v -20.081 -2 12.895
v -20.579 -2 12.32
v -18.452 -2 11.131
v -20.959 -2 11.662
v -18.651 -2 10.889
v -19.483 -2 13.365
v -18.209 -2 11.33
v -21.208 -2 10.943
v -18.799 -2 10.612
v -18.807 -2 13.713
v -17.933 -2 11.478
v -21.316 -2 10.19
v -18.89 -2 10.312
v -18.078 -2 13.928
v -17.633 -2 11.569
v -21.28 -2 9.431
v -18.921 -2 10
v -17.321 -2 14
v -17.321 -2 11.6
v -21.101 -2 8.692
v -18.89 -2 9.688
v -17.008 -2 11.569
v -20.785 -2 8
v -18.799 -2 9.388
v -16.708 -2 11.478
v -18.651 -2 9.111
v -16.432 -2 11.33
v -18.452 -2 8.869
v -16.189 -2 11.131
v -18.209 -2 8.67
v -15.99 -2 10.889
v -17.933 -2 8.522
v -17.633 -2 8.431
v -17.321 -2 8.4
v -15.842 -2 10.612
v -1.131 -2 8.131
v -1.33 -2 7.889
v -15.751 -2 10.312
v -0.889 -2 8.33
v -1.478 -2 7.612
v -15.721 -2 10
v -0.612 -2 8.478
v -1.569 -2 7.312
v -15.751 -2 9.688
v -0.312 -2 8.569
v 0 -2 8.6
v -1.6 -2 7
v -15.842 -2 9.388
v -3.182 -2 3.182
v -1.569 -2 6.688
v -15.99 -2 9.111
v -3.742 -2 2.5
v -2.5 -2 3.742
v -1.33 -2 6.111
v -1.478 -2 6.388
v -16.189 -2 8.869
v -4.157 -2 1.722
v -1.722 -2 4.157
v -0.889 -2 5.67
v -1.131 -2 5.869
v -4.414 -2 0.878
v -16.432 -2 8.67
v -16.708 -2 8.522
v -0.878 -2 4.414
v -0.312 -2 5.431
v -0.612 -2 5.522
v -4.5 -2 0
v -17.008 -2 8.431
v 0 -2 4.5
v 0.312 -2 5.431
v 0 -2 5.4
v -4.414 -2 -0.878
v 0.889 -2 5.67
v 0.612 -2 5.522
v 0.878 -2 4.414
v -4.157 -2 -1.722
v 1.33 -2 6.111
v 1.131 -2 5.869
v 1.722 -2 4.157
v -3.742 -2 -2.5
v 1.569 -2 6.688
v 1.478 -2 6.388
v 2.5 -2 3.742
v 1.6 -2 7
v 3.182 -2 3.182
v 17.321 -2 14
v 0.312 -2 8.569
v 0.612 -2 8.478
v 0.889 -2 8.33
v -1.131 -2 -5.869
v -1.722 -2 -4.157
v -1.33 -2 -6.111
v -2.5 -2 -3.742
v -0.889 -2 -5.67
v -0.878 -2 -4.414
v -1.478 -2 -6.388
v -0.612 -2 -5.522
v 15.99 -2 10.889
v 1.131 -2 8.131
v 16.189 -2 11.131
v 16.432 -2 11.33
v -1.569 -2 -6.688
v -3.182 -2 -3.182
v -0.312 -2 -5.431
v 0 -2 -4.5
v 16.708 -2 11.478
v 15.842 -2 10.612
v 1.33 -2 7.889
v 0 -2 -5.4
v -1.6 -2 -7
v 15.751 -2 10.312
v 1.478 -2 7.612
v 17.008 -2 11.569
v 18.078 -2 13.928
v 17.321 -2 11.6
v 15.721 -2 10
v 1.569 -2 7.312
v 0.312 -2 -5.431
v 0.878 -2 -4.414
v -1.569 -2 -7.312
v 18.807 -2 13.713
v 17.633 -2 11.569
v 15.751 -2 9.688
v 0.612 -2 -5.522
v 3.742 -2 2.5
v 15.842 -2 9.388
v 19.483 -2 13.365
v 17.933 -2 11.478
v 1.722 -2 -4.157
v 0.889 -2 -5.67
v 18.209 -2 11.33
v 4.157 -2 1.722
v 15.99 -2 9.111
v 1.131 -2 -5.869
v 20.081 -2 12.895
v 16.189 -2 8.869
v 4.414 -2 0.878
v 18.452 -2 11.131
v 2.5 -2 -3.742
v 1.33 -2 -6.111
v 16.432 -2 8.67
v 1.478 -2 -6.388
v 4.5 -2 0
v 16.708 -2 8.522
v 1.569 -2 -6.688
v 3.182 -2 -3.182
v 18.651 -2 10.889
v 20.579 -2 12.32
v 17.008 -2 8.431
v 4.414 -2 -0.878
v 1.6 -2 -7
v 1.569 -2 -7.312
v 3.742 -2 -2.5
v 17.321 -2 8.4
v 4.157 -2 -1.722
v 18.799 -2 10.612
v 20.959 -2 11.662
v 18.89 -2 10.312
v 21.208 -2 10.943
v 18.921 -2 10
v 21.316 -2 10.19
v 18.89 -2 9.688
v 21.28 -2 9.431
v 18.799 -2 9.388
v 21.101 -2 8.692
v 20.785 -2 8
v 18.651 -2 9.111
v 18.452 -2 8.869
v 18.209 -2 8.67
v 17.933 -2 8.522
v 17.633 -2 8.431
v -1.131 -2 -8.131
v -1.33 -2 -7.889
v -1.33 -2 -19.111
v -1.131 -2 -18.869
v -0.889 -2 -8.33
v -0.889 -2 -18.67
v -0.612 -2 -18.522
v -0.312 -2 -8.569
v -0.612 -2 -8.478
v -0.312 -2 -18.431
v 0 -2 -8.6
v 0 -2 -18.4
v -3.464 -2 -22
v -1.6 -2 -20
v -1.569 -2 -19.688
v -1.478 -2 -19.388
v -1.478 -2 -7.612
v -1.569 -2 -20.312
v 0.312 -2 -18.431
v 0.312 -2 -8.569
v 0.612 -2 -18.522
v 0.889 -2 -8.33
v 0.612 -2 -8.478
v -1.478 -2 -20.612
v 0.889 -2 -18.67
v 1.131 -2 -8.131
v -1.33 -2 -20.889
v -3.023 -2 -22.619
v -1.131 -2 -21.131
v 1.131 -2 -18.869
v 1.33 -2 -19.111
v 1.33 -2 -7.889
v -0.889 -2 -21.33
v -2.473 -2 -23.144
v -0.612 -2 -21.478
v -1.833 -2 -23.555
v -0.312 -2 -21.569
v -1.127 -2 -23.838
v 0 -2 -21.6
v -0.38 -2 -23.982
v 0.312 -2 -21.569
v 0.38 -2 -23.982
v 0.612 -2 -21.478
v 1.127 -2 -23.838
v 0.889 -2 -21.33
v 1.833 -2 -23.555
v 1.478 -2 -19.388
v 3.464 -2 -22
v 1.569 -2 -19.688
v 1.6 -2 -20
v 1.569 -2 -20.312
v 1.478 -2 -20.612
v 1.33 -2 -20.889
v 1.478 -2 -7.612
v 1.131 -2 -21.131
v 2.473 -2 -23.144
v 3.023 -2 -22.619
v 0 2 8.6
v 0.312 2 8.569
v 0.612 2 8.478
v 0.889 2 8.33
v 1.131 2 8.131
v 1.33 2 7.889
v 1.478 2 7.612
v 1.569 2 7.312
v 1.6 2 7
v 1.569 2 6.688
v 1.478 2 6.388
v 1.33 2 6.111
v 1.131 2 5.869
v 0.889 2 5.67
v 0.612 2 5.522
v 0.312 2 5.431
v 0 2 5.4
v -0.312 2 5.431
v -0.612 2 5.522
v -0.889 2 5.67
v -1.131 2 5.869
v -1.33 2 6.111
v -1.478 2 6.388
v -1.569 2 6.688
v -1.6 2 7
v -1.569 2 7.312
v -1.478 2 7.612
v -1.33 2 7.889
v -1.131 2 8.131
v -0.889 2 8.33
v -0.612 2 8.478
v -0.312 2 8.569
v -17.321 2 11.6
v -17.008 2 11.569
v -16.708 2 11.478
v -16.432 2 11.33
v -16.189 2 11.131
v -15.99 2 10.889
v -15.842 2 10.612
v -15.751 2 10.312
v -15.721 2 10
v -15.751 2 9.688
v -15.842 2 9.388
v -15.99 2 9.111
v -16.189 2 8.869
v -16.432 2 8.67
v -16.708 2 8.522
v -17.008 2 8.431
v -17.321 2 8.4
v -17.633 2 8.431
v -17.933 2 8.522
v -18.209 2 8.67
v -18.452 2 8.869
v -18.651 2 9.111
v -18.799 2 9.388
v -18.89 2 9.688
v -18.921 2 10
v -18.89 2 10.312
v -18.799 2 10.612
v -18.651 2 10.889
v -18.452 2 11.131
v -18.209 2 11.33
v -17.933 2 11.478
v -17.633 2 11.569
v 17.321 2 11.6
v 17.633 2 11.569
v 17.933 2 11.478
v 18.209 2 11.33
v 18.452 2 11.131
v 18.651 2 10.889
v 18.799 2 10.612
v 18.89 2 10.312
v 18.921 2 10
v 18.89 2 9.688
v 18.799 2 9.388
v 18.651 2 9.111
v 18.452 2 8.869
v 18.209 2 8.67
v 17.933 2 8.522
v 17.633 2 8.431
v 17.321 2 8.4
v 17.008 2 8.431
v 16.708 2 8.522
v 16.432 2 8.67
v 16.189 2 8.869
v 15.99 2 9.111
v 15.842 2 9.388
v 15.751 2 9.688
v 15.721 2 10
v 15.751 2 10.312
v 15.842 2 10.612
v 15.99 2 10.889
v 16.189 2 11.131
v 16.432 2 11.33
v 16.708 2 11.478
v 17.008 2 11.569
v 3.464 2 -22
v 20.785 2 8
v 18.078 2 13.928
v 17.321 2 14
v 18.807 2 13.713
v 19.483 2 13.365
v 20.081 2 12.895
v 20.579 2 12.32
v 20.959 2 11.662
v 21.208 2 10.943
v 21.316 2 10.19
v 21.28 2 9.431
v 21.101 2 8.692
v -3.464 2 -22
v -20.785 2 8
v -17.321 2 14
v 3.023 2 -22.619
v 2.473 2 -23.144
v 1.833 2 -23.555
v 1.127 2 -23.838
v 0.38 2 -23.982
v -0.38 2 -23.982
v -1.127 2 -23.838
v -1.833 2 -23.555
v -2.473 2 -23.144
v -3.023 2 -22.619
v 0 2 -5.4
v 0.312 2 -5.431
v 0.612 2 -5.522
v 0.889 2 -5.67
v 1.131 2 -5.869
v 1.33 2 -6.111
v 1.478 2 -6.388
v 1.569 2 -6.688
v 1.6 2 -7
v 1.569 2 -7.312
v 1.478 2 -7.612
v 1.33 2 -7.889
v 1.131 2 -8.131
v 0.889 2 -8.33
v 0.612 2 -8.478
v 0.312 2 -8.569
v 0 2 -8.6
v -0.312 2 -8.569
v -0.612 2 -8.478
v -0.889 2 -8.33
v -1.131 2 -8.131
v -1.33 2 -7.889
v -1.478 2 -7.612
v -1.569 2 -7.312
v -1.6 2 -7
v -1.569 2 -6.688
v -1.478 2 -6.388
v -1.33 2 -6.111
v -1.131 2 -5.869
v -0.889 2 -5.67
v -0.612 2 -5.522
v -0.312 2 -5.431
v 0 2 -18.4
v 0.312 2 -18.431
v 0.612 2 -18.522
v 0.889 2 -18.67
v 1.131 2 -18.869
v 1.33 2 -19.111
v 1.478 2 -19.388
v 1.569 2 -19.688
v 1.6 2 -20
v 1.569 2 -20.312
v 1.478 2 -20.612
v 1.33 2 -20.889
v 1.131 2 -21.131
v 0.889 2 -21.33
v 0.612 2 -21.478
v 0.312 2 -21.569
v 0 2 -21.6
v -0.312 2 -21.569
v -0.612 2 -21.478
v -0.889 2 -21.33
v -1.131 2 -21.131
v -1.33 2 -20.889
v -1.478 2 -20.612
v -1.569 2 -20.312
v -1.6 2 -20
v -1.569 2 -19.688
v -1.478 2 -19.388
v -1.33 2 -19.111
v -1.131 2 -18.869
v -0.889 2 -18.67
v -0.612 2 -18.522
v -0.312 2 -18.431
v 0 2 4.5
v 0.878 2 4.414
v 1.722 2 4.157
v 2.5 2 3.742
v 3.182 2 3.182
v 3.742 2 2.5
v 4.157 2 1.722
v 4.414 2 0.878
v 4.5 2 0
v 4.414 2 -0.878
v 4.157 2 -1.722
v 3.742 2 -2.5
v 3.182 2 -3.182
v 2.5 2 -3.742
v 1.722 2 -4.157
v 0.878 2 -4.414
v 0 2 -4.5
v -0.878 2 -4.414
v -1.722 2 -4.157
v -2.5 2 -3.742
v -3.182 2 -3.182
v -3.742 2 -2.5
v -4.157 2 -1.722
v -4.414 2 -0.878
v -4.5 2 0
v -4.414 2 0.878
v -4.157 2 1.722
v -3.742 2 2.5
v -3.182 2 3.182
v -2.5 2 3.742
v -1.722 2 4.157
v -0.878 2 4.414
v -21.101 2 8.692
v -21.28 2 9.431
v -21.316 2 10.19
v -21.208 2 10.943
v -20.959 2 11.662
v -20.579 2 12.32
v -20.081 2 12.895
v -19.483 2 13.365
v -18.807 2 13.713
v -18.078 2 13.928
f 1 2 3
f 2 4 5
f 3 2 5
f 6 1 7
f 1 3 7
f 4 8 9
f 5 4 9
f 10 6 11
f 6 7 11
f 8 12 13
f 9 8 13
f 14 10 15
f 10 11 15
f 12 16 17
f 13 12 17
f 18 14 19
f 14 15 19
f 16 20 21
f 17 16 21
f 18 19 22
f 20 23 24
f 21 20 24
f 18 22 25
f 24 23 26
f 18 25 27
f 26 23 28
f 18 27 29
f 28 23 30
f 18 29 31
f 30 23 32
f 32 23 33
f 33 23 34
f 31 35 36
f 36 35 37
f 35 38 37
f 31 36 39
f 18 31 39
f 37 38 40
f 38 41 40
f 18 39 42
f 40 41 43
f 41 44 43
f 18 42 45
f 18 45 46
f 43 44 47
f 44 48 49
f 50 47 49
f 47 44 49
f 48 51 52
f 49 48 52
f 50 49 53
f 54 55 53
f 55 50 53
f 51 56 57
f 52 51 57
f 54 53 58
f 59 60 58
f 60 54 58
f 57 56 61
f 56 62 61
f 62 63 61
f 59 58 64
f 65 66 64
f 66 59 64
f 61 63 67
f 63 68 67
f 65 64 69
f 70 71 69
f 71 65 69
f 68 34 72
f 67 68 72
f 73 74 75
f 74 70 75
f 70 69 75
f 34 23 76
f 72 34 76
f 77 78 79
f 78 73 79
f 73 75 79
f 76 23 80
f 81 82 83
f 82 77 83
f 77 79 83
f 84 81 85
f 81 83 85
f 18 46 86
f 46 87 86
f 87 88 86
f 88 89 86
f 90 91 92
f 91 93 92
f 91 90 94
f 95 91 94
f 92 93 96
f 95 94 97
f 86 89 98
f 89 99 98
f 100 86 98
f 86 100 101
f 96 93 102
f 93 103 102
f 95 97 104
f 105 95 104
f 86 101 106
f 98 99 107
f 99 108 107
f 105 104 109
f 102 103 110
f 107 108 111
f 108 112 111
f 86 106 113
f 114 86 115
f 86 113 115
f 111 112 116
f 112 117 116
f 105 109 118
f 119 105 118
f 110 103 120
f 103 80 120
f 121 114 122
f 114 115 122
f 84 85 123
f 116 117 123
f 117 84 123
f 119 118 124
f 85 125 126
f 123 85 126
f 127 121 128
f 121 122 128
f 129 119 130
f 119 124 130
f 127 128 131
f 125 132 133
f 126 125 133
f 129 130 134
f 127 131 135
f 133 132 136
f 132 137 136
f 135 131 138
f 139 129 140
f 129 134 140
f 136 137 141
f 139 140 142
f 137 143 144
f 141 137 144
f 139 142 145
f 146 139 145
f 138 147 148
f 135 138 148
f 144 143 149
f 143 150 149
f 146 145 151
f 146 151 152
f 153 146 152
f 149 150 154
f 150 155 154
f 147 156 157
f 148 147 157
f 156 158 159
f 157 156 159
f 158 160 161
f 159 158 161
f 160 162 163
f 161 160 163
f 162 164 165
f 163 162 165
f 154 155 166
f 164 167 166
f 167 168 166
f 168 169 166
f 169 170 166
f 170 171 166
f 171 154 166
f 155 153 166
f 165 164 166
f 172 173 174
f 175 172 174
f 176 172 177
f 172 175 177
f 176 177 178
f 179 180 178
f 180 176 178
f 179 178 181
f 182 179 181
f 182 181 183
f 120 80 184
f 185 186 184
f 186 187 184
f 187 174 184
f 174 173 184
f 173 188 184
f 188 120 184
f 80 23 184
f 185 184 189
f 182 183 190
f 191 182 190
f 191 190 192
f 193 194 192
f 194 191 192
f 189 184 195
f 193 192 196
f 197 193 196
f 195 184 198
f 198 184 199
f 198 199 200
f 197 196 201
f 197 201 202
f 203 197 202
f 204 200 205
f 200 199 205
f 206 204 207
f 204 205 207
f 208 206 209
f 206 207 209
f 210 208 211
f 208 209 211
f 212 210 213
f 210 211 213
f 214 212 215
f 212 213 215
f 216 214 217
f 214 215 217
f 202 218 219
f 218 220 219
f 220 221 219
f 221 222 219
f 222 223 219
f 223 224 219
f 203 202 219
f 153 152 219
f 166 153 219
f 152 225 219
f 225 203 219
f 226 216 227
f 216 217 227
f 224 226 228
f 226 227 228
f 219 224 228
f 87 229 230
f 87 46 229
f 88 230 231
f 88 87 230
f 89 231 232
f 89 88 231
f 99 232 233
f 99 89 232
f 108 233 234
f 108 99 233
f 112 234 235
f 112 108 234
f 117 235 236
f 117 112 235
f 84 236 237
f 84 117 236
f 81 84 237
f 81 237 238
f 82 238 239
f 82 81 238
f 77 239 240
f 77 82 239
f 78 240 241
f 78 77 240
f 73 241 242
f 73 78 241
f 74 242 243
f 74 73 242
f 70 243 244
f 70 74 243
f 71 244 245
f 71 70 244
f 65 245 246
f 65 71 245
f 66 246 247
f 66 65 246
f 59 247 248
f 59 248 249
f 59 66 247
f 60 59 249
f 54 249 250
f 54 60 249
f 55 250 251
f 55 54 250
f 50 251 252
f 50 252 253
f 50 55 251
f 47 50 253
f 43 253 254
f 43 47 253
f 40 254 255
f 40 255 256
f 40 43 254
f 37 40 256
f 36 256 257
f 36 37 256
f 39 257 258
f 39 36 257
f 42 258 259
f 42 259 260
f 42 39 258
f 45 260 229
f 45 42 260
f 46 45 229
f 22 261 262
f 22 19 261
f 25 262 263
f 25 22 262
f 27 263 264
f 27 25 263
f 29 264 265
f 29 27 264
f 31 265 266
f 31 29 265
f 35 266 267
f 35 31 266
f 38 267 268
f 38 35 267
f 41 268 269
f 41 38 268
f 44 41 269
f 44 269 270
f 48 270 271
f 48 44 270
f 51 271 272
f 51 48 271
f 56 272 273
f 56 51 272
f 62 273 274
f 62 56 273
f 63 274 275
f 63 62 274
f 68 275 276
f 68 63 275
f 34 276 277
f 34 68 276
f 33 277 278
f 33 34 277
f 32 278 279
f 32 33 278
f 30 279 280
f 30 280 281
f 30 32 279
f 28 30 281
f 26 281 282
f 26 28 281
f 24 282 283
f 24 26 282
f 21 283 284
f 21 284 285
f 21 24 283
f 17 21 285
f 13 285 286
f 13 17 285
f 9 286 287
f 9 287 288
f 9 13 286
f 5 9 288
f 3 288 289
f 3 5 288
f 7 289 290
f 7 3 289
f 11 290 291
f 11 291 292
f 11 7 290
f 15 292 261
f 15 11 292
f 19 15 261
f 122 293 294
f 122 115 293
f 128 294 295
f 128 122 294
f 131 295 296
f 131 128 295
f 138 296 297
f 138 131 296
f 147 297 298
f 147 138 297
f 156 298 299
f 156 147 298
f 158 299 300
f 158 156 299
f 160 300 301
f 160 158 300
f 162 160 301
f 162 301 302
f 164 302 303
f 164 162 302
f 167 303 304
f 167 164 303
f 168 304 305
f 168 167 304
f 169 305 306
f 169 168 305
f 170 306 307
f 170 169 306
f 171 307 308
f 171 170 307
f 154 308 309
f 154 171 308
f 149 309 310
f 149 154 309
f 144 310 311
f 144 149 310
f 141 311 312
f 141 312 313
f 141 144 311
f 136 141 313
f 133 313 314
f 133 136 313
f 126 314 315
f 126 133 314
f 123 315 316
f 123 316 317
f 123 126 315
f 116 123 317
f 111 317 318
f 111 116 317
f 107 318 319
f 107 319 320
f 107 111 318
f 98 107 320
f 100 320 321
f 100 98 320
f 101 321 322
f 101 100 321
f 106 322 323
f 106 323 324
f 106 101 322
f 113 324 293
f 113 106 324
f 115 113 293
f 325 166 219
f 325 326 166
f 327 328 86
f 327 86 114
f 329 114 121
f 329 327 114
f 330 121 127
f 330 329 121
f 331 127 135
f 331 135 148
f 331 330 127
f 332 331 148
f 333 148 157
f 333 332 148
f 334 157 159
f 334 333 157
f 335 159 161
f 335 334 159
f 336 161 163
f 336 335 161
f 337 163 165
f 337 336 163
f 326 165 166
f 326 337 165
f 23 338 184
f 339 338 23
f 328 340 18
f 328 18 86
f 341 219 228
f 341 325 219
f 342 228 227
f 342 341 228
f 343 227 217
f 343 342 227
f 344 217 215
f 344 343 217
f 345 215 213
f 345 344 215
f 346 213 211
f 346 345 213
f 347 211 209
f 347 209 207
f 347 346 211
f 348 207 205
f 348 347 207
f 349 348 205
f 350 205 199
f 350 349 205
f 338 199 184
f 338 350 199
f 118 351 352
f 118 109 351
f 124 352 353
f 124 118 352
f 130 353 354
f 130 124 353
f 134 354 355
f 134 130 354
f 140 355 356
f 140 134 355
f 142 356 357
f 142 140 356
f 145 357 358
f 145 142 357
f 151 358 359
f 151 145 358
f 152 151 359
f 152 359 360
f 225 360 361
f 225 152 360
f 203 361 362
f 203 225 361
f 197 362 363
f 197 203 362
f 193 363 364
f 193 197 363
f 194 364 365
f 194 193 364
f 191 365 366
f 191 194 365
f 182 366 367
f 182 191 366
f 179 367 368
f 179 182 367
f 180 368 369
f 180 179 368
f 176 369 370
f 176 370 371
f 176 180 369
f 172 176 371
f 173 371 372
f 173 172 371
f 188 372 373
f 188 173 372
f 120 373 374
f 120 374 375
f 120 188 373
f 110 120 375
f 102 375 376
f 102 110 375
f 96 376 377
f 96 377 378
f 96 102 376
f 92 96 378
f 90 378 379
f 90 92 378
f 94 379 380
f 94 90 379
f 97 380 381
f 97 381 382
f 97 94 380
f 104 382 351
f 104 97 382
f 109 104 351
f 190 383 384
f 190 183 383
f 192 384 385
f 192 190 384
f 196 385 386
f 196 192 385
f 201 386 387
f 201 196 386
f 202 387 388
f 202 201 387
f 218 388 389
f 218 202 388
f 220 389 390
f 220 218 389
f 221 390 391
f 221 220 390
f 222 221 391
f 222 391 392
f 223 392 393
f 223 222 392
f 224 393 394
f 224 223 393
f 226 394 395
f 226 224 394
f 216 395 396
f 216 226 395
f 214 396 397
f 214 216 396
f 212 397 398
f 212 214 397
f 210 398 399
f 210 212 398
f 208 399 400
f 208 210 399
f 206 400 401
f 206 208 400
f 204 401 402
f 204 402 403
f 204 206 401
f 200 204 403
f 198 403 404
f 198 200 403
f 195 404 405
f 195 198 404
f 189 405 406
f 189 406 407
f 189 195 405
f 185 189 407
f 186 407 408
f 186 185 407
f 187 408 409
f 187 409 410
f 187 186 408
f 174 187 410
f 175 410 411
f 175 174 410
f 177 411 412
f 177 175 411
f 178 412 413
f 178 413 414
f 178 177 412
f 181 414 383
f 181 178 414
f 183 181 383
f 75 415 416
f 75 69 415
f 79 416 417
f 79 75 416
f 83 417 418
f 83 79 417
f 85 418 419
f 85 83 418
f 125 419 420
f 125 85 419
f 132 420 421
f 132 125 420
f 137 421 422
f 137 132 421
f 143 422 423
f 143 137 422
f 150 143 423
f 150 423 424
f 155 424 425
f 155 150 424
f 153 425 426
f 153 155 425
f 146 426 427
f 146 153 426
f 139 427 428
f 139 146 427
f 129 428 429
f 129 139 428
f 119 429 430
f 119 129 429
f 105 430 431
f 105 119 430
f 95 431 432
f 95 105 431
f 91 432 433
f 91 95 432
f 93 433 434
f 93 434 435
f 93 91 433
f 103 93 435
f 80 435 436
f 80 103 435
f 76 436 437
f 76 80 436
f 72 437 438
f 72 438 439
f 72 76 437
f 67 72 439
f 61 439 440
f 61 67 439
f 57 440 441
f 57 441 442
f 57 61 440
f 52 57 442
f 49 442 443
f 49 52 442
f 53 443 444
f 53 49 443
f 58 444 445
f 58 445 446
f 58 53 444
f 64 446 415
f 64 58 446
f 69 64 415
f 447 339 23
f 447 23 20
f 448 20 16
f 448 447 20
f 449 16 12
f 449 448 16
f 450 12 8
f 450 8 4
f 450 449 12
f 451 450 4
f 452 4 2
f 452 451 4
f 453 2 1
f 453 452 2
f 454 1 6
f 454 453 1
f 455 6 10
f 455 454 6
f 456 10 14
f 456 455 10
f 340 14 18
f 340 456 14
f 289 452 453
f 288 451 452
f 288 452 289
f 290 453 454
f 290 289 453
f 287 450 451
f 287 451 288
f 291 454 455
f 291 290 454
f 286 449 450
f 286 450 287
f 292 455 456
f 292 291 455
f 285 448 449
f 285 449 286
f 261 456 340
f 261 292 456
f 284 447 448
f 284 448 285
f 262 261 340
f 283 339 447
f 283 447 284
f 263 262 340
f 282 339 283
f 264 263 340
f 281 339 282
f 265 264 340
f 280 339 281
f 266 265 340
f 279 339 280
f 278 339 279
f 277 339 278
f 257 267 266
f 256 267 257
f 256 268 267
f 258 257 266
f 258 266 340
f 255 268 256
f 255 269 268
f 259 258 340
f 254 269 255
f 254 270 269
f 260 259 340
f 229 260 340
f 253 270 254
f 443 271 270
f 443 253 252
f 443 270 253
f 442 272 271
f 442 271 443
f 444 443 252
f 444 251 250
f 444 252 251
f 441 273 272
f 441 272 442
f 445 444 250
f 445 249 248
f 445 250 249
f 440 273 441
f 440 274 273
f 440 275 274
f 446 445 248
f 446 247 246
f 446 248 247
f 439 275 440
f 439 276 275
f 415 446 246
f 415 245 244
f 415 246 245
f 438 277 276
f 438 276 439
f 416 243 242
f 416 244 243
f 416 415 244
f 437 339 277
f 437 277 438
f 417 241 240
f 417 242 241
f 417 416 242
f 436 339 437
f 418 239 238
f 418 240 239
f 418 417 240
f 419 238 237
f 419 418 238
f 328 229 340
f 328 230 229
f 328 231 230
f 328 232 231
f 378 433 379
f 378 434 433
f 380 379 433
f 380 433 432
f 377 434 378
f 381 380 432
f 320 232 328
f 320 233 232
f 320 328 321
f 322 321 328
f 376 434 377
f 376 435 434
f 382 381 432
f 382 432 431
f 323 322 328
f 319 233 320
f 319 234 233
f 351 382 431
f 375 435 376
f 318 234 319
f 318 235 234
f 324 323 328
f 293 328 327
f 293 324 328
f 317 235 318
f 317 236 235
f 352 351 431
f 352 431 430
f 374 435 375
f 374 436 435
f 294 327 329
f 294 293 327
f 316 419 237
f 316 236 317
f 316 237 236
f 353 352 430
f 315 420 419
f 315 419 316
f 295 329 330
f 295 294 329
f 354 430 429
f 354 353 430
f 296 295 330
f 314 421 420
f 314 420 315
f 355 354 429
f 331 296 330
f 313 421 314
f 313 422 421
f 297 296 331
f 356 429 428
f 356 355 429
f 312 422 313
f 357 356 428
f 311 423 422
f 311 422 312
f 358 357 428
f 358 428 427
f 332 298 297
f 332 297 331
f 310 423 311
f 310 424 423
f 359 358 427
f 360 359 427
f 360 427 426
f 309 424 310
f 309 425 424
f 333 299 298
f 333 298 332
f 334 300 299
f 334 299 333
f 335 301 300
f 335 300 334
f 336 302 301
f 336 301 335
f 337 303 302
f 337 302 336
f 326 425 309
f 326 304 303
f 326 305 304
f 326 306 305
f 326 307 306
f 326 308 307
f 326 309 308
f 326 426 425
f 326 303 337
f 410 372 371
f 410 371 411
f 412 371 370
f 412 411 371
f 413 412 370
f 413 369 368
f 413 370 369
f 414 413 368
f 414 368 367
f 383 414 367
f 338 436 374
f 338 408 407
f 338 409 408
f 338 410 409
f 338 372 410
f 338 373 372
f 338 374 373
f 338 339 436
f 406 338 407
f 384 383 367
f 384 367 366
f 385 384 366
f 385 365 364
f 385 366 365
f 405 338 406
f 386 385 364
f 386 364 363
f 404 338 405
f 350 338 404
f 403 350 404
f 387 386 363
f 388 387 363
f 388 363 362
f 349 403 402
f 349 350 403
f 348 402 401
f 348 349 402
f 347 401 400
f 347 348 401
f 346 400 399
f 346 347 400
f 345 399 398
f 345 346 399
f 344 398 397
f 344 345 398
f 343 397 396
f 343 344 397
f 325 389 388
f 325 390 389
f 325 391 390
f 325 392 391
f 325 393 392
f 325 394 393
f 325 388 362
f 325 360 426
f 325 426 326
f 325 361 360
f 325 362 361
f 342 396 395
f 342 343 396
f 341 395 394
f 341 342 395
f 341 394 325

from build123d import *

# Parameters (mm, degrees)
SKETCH_2_R      = 1.6
SKETCH_2_R_2    = 4.5
EXTRUDE_1_DEPTH = 2


with BuildPart() as part:
    # 草图2 → 凸台-拉伸1 (new, symmetric)
    with BuildSketch(Plane(origin=(0, 0, 0), x_dir=(1, 0, 0), z_dir=(0, 1, 0))):
        with BuildLine():
            Line((-3.464101615, 22), (-20.784609691, -8))
            ThreePointArc((-20.784609691, -8), (-20.784609691, -12), (-17.320508076, -14))
            Line((-17.320508076, -14), (17.320508076, -14))
            ThreePointArc((17.320508076, -14), (20.784609691, -12), (20.784609691, -8))
            Line((20.784609691, -8), (3.464101615, 22))
            ThreePointArc((3.464101615, 22), (0, 24), (-3.464101615, 22))
        make_face()
        with Locations(Location((0, 7, 0), (0, 0, 270))):
            Circle(SKETCH_2_R, mode=Mode.SUBTRACT)
        with Locations(Location((0, -7, 0), (0, 0, 270))):
            Circle(SKETCH_2_R, mode=Mode.SUBTRACT)
        with Locations(Location((0, 20, 0), (0, 0, 270))):
            Circle(SKETCH_2_R, mode=Mode.SUBTRACT)
        with Locations(Location((17.320508076, -10, 0), (0, 0, 270))):
            Circle(SKETCH_2_R, mode=Mode.SUBTRACT)
        with Locations(Location((-17.320508076, -10, 0), (0, 0, 270))):
            Circle(SKETCH_2_R, mode=Mode.SUBTRACT)
        with Locations(Location((0, 0, 0), (0, 0, 270))):
            Circle(SKETCH_2_R_2, mode=Mode.SUBTRACT)
    extrude(amount=EXTRUDE_1_DEPTH, both=True)


solid = part.part
